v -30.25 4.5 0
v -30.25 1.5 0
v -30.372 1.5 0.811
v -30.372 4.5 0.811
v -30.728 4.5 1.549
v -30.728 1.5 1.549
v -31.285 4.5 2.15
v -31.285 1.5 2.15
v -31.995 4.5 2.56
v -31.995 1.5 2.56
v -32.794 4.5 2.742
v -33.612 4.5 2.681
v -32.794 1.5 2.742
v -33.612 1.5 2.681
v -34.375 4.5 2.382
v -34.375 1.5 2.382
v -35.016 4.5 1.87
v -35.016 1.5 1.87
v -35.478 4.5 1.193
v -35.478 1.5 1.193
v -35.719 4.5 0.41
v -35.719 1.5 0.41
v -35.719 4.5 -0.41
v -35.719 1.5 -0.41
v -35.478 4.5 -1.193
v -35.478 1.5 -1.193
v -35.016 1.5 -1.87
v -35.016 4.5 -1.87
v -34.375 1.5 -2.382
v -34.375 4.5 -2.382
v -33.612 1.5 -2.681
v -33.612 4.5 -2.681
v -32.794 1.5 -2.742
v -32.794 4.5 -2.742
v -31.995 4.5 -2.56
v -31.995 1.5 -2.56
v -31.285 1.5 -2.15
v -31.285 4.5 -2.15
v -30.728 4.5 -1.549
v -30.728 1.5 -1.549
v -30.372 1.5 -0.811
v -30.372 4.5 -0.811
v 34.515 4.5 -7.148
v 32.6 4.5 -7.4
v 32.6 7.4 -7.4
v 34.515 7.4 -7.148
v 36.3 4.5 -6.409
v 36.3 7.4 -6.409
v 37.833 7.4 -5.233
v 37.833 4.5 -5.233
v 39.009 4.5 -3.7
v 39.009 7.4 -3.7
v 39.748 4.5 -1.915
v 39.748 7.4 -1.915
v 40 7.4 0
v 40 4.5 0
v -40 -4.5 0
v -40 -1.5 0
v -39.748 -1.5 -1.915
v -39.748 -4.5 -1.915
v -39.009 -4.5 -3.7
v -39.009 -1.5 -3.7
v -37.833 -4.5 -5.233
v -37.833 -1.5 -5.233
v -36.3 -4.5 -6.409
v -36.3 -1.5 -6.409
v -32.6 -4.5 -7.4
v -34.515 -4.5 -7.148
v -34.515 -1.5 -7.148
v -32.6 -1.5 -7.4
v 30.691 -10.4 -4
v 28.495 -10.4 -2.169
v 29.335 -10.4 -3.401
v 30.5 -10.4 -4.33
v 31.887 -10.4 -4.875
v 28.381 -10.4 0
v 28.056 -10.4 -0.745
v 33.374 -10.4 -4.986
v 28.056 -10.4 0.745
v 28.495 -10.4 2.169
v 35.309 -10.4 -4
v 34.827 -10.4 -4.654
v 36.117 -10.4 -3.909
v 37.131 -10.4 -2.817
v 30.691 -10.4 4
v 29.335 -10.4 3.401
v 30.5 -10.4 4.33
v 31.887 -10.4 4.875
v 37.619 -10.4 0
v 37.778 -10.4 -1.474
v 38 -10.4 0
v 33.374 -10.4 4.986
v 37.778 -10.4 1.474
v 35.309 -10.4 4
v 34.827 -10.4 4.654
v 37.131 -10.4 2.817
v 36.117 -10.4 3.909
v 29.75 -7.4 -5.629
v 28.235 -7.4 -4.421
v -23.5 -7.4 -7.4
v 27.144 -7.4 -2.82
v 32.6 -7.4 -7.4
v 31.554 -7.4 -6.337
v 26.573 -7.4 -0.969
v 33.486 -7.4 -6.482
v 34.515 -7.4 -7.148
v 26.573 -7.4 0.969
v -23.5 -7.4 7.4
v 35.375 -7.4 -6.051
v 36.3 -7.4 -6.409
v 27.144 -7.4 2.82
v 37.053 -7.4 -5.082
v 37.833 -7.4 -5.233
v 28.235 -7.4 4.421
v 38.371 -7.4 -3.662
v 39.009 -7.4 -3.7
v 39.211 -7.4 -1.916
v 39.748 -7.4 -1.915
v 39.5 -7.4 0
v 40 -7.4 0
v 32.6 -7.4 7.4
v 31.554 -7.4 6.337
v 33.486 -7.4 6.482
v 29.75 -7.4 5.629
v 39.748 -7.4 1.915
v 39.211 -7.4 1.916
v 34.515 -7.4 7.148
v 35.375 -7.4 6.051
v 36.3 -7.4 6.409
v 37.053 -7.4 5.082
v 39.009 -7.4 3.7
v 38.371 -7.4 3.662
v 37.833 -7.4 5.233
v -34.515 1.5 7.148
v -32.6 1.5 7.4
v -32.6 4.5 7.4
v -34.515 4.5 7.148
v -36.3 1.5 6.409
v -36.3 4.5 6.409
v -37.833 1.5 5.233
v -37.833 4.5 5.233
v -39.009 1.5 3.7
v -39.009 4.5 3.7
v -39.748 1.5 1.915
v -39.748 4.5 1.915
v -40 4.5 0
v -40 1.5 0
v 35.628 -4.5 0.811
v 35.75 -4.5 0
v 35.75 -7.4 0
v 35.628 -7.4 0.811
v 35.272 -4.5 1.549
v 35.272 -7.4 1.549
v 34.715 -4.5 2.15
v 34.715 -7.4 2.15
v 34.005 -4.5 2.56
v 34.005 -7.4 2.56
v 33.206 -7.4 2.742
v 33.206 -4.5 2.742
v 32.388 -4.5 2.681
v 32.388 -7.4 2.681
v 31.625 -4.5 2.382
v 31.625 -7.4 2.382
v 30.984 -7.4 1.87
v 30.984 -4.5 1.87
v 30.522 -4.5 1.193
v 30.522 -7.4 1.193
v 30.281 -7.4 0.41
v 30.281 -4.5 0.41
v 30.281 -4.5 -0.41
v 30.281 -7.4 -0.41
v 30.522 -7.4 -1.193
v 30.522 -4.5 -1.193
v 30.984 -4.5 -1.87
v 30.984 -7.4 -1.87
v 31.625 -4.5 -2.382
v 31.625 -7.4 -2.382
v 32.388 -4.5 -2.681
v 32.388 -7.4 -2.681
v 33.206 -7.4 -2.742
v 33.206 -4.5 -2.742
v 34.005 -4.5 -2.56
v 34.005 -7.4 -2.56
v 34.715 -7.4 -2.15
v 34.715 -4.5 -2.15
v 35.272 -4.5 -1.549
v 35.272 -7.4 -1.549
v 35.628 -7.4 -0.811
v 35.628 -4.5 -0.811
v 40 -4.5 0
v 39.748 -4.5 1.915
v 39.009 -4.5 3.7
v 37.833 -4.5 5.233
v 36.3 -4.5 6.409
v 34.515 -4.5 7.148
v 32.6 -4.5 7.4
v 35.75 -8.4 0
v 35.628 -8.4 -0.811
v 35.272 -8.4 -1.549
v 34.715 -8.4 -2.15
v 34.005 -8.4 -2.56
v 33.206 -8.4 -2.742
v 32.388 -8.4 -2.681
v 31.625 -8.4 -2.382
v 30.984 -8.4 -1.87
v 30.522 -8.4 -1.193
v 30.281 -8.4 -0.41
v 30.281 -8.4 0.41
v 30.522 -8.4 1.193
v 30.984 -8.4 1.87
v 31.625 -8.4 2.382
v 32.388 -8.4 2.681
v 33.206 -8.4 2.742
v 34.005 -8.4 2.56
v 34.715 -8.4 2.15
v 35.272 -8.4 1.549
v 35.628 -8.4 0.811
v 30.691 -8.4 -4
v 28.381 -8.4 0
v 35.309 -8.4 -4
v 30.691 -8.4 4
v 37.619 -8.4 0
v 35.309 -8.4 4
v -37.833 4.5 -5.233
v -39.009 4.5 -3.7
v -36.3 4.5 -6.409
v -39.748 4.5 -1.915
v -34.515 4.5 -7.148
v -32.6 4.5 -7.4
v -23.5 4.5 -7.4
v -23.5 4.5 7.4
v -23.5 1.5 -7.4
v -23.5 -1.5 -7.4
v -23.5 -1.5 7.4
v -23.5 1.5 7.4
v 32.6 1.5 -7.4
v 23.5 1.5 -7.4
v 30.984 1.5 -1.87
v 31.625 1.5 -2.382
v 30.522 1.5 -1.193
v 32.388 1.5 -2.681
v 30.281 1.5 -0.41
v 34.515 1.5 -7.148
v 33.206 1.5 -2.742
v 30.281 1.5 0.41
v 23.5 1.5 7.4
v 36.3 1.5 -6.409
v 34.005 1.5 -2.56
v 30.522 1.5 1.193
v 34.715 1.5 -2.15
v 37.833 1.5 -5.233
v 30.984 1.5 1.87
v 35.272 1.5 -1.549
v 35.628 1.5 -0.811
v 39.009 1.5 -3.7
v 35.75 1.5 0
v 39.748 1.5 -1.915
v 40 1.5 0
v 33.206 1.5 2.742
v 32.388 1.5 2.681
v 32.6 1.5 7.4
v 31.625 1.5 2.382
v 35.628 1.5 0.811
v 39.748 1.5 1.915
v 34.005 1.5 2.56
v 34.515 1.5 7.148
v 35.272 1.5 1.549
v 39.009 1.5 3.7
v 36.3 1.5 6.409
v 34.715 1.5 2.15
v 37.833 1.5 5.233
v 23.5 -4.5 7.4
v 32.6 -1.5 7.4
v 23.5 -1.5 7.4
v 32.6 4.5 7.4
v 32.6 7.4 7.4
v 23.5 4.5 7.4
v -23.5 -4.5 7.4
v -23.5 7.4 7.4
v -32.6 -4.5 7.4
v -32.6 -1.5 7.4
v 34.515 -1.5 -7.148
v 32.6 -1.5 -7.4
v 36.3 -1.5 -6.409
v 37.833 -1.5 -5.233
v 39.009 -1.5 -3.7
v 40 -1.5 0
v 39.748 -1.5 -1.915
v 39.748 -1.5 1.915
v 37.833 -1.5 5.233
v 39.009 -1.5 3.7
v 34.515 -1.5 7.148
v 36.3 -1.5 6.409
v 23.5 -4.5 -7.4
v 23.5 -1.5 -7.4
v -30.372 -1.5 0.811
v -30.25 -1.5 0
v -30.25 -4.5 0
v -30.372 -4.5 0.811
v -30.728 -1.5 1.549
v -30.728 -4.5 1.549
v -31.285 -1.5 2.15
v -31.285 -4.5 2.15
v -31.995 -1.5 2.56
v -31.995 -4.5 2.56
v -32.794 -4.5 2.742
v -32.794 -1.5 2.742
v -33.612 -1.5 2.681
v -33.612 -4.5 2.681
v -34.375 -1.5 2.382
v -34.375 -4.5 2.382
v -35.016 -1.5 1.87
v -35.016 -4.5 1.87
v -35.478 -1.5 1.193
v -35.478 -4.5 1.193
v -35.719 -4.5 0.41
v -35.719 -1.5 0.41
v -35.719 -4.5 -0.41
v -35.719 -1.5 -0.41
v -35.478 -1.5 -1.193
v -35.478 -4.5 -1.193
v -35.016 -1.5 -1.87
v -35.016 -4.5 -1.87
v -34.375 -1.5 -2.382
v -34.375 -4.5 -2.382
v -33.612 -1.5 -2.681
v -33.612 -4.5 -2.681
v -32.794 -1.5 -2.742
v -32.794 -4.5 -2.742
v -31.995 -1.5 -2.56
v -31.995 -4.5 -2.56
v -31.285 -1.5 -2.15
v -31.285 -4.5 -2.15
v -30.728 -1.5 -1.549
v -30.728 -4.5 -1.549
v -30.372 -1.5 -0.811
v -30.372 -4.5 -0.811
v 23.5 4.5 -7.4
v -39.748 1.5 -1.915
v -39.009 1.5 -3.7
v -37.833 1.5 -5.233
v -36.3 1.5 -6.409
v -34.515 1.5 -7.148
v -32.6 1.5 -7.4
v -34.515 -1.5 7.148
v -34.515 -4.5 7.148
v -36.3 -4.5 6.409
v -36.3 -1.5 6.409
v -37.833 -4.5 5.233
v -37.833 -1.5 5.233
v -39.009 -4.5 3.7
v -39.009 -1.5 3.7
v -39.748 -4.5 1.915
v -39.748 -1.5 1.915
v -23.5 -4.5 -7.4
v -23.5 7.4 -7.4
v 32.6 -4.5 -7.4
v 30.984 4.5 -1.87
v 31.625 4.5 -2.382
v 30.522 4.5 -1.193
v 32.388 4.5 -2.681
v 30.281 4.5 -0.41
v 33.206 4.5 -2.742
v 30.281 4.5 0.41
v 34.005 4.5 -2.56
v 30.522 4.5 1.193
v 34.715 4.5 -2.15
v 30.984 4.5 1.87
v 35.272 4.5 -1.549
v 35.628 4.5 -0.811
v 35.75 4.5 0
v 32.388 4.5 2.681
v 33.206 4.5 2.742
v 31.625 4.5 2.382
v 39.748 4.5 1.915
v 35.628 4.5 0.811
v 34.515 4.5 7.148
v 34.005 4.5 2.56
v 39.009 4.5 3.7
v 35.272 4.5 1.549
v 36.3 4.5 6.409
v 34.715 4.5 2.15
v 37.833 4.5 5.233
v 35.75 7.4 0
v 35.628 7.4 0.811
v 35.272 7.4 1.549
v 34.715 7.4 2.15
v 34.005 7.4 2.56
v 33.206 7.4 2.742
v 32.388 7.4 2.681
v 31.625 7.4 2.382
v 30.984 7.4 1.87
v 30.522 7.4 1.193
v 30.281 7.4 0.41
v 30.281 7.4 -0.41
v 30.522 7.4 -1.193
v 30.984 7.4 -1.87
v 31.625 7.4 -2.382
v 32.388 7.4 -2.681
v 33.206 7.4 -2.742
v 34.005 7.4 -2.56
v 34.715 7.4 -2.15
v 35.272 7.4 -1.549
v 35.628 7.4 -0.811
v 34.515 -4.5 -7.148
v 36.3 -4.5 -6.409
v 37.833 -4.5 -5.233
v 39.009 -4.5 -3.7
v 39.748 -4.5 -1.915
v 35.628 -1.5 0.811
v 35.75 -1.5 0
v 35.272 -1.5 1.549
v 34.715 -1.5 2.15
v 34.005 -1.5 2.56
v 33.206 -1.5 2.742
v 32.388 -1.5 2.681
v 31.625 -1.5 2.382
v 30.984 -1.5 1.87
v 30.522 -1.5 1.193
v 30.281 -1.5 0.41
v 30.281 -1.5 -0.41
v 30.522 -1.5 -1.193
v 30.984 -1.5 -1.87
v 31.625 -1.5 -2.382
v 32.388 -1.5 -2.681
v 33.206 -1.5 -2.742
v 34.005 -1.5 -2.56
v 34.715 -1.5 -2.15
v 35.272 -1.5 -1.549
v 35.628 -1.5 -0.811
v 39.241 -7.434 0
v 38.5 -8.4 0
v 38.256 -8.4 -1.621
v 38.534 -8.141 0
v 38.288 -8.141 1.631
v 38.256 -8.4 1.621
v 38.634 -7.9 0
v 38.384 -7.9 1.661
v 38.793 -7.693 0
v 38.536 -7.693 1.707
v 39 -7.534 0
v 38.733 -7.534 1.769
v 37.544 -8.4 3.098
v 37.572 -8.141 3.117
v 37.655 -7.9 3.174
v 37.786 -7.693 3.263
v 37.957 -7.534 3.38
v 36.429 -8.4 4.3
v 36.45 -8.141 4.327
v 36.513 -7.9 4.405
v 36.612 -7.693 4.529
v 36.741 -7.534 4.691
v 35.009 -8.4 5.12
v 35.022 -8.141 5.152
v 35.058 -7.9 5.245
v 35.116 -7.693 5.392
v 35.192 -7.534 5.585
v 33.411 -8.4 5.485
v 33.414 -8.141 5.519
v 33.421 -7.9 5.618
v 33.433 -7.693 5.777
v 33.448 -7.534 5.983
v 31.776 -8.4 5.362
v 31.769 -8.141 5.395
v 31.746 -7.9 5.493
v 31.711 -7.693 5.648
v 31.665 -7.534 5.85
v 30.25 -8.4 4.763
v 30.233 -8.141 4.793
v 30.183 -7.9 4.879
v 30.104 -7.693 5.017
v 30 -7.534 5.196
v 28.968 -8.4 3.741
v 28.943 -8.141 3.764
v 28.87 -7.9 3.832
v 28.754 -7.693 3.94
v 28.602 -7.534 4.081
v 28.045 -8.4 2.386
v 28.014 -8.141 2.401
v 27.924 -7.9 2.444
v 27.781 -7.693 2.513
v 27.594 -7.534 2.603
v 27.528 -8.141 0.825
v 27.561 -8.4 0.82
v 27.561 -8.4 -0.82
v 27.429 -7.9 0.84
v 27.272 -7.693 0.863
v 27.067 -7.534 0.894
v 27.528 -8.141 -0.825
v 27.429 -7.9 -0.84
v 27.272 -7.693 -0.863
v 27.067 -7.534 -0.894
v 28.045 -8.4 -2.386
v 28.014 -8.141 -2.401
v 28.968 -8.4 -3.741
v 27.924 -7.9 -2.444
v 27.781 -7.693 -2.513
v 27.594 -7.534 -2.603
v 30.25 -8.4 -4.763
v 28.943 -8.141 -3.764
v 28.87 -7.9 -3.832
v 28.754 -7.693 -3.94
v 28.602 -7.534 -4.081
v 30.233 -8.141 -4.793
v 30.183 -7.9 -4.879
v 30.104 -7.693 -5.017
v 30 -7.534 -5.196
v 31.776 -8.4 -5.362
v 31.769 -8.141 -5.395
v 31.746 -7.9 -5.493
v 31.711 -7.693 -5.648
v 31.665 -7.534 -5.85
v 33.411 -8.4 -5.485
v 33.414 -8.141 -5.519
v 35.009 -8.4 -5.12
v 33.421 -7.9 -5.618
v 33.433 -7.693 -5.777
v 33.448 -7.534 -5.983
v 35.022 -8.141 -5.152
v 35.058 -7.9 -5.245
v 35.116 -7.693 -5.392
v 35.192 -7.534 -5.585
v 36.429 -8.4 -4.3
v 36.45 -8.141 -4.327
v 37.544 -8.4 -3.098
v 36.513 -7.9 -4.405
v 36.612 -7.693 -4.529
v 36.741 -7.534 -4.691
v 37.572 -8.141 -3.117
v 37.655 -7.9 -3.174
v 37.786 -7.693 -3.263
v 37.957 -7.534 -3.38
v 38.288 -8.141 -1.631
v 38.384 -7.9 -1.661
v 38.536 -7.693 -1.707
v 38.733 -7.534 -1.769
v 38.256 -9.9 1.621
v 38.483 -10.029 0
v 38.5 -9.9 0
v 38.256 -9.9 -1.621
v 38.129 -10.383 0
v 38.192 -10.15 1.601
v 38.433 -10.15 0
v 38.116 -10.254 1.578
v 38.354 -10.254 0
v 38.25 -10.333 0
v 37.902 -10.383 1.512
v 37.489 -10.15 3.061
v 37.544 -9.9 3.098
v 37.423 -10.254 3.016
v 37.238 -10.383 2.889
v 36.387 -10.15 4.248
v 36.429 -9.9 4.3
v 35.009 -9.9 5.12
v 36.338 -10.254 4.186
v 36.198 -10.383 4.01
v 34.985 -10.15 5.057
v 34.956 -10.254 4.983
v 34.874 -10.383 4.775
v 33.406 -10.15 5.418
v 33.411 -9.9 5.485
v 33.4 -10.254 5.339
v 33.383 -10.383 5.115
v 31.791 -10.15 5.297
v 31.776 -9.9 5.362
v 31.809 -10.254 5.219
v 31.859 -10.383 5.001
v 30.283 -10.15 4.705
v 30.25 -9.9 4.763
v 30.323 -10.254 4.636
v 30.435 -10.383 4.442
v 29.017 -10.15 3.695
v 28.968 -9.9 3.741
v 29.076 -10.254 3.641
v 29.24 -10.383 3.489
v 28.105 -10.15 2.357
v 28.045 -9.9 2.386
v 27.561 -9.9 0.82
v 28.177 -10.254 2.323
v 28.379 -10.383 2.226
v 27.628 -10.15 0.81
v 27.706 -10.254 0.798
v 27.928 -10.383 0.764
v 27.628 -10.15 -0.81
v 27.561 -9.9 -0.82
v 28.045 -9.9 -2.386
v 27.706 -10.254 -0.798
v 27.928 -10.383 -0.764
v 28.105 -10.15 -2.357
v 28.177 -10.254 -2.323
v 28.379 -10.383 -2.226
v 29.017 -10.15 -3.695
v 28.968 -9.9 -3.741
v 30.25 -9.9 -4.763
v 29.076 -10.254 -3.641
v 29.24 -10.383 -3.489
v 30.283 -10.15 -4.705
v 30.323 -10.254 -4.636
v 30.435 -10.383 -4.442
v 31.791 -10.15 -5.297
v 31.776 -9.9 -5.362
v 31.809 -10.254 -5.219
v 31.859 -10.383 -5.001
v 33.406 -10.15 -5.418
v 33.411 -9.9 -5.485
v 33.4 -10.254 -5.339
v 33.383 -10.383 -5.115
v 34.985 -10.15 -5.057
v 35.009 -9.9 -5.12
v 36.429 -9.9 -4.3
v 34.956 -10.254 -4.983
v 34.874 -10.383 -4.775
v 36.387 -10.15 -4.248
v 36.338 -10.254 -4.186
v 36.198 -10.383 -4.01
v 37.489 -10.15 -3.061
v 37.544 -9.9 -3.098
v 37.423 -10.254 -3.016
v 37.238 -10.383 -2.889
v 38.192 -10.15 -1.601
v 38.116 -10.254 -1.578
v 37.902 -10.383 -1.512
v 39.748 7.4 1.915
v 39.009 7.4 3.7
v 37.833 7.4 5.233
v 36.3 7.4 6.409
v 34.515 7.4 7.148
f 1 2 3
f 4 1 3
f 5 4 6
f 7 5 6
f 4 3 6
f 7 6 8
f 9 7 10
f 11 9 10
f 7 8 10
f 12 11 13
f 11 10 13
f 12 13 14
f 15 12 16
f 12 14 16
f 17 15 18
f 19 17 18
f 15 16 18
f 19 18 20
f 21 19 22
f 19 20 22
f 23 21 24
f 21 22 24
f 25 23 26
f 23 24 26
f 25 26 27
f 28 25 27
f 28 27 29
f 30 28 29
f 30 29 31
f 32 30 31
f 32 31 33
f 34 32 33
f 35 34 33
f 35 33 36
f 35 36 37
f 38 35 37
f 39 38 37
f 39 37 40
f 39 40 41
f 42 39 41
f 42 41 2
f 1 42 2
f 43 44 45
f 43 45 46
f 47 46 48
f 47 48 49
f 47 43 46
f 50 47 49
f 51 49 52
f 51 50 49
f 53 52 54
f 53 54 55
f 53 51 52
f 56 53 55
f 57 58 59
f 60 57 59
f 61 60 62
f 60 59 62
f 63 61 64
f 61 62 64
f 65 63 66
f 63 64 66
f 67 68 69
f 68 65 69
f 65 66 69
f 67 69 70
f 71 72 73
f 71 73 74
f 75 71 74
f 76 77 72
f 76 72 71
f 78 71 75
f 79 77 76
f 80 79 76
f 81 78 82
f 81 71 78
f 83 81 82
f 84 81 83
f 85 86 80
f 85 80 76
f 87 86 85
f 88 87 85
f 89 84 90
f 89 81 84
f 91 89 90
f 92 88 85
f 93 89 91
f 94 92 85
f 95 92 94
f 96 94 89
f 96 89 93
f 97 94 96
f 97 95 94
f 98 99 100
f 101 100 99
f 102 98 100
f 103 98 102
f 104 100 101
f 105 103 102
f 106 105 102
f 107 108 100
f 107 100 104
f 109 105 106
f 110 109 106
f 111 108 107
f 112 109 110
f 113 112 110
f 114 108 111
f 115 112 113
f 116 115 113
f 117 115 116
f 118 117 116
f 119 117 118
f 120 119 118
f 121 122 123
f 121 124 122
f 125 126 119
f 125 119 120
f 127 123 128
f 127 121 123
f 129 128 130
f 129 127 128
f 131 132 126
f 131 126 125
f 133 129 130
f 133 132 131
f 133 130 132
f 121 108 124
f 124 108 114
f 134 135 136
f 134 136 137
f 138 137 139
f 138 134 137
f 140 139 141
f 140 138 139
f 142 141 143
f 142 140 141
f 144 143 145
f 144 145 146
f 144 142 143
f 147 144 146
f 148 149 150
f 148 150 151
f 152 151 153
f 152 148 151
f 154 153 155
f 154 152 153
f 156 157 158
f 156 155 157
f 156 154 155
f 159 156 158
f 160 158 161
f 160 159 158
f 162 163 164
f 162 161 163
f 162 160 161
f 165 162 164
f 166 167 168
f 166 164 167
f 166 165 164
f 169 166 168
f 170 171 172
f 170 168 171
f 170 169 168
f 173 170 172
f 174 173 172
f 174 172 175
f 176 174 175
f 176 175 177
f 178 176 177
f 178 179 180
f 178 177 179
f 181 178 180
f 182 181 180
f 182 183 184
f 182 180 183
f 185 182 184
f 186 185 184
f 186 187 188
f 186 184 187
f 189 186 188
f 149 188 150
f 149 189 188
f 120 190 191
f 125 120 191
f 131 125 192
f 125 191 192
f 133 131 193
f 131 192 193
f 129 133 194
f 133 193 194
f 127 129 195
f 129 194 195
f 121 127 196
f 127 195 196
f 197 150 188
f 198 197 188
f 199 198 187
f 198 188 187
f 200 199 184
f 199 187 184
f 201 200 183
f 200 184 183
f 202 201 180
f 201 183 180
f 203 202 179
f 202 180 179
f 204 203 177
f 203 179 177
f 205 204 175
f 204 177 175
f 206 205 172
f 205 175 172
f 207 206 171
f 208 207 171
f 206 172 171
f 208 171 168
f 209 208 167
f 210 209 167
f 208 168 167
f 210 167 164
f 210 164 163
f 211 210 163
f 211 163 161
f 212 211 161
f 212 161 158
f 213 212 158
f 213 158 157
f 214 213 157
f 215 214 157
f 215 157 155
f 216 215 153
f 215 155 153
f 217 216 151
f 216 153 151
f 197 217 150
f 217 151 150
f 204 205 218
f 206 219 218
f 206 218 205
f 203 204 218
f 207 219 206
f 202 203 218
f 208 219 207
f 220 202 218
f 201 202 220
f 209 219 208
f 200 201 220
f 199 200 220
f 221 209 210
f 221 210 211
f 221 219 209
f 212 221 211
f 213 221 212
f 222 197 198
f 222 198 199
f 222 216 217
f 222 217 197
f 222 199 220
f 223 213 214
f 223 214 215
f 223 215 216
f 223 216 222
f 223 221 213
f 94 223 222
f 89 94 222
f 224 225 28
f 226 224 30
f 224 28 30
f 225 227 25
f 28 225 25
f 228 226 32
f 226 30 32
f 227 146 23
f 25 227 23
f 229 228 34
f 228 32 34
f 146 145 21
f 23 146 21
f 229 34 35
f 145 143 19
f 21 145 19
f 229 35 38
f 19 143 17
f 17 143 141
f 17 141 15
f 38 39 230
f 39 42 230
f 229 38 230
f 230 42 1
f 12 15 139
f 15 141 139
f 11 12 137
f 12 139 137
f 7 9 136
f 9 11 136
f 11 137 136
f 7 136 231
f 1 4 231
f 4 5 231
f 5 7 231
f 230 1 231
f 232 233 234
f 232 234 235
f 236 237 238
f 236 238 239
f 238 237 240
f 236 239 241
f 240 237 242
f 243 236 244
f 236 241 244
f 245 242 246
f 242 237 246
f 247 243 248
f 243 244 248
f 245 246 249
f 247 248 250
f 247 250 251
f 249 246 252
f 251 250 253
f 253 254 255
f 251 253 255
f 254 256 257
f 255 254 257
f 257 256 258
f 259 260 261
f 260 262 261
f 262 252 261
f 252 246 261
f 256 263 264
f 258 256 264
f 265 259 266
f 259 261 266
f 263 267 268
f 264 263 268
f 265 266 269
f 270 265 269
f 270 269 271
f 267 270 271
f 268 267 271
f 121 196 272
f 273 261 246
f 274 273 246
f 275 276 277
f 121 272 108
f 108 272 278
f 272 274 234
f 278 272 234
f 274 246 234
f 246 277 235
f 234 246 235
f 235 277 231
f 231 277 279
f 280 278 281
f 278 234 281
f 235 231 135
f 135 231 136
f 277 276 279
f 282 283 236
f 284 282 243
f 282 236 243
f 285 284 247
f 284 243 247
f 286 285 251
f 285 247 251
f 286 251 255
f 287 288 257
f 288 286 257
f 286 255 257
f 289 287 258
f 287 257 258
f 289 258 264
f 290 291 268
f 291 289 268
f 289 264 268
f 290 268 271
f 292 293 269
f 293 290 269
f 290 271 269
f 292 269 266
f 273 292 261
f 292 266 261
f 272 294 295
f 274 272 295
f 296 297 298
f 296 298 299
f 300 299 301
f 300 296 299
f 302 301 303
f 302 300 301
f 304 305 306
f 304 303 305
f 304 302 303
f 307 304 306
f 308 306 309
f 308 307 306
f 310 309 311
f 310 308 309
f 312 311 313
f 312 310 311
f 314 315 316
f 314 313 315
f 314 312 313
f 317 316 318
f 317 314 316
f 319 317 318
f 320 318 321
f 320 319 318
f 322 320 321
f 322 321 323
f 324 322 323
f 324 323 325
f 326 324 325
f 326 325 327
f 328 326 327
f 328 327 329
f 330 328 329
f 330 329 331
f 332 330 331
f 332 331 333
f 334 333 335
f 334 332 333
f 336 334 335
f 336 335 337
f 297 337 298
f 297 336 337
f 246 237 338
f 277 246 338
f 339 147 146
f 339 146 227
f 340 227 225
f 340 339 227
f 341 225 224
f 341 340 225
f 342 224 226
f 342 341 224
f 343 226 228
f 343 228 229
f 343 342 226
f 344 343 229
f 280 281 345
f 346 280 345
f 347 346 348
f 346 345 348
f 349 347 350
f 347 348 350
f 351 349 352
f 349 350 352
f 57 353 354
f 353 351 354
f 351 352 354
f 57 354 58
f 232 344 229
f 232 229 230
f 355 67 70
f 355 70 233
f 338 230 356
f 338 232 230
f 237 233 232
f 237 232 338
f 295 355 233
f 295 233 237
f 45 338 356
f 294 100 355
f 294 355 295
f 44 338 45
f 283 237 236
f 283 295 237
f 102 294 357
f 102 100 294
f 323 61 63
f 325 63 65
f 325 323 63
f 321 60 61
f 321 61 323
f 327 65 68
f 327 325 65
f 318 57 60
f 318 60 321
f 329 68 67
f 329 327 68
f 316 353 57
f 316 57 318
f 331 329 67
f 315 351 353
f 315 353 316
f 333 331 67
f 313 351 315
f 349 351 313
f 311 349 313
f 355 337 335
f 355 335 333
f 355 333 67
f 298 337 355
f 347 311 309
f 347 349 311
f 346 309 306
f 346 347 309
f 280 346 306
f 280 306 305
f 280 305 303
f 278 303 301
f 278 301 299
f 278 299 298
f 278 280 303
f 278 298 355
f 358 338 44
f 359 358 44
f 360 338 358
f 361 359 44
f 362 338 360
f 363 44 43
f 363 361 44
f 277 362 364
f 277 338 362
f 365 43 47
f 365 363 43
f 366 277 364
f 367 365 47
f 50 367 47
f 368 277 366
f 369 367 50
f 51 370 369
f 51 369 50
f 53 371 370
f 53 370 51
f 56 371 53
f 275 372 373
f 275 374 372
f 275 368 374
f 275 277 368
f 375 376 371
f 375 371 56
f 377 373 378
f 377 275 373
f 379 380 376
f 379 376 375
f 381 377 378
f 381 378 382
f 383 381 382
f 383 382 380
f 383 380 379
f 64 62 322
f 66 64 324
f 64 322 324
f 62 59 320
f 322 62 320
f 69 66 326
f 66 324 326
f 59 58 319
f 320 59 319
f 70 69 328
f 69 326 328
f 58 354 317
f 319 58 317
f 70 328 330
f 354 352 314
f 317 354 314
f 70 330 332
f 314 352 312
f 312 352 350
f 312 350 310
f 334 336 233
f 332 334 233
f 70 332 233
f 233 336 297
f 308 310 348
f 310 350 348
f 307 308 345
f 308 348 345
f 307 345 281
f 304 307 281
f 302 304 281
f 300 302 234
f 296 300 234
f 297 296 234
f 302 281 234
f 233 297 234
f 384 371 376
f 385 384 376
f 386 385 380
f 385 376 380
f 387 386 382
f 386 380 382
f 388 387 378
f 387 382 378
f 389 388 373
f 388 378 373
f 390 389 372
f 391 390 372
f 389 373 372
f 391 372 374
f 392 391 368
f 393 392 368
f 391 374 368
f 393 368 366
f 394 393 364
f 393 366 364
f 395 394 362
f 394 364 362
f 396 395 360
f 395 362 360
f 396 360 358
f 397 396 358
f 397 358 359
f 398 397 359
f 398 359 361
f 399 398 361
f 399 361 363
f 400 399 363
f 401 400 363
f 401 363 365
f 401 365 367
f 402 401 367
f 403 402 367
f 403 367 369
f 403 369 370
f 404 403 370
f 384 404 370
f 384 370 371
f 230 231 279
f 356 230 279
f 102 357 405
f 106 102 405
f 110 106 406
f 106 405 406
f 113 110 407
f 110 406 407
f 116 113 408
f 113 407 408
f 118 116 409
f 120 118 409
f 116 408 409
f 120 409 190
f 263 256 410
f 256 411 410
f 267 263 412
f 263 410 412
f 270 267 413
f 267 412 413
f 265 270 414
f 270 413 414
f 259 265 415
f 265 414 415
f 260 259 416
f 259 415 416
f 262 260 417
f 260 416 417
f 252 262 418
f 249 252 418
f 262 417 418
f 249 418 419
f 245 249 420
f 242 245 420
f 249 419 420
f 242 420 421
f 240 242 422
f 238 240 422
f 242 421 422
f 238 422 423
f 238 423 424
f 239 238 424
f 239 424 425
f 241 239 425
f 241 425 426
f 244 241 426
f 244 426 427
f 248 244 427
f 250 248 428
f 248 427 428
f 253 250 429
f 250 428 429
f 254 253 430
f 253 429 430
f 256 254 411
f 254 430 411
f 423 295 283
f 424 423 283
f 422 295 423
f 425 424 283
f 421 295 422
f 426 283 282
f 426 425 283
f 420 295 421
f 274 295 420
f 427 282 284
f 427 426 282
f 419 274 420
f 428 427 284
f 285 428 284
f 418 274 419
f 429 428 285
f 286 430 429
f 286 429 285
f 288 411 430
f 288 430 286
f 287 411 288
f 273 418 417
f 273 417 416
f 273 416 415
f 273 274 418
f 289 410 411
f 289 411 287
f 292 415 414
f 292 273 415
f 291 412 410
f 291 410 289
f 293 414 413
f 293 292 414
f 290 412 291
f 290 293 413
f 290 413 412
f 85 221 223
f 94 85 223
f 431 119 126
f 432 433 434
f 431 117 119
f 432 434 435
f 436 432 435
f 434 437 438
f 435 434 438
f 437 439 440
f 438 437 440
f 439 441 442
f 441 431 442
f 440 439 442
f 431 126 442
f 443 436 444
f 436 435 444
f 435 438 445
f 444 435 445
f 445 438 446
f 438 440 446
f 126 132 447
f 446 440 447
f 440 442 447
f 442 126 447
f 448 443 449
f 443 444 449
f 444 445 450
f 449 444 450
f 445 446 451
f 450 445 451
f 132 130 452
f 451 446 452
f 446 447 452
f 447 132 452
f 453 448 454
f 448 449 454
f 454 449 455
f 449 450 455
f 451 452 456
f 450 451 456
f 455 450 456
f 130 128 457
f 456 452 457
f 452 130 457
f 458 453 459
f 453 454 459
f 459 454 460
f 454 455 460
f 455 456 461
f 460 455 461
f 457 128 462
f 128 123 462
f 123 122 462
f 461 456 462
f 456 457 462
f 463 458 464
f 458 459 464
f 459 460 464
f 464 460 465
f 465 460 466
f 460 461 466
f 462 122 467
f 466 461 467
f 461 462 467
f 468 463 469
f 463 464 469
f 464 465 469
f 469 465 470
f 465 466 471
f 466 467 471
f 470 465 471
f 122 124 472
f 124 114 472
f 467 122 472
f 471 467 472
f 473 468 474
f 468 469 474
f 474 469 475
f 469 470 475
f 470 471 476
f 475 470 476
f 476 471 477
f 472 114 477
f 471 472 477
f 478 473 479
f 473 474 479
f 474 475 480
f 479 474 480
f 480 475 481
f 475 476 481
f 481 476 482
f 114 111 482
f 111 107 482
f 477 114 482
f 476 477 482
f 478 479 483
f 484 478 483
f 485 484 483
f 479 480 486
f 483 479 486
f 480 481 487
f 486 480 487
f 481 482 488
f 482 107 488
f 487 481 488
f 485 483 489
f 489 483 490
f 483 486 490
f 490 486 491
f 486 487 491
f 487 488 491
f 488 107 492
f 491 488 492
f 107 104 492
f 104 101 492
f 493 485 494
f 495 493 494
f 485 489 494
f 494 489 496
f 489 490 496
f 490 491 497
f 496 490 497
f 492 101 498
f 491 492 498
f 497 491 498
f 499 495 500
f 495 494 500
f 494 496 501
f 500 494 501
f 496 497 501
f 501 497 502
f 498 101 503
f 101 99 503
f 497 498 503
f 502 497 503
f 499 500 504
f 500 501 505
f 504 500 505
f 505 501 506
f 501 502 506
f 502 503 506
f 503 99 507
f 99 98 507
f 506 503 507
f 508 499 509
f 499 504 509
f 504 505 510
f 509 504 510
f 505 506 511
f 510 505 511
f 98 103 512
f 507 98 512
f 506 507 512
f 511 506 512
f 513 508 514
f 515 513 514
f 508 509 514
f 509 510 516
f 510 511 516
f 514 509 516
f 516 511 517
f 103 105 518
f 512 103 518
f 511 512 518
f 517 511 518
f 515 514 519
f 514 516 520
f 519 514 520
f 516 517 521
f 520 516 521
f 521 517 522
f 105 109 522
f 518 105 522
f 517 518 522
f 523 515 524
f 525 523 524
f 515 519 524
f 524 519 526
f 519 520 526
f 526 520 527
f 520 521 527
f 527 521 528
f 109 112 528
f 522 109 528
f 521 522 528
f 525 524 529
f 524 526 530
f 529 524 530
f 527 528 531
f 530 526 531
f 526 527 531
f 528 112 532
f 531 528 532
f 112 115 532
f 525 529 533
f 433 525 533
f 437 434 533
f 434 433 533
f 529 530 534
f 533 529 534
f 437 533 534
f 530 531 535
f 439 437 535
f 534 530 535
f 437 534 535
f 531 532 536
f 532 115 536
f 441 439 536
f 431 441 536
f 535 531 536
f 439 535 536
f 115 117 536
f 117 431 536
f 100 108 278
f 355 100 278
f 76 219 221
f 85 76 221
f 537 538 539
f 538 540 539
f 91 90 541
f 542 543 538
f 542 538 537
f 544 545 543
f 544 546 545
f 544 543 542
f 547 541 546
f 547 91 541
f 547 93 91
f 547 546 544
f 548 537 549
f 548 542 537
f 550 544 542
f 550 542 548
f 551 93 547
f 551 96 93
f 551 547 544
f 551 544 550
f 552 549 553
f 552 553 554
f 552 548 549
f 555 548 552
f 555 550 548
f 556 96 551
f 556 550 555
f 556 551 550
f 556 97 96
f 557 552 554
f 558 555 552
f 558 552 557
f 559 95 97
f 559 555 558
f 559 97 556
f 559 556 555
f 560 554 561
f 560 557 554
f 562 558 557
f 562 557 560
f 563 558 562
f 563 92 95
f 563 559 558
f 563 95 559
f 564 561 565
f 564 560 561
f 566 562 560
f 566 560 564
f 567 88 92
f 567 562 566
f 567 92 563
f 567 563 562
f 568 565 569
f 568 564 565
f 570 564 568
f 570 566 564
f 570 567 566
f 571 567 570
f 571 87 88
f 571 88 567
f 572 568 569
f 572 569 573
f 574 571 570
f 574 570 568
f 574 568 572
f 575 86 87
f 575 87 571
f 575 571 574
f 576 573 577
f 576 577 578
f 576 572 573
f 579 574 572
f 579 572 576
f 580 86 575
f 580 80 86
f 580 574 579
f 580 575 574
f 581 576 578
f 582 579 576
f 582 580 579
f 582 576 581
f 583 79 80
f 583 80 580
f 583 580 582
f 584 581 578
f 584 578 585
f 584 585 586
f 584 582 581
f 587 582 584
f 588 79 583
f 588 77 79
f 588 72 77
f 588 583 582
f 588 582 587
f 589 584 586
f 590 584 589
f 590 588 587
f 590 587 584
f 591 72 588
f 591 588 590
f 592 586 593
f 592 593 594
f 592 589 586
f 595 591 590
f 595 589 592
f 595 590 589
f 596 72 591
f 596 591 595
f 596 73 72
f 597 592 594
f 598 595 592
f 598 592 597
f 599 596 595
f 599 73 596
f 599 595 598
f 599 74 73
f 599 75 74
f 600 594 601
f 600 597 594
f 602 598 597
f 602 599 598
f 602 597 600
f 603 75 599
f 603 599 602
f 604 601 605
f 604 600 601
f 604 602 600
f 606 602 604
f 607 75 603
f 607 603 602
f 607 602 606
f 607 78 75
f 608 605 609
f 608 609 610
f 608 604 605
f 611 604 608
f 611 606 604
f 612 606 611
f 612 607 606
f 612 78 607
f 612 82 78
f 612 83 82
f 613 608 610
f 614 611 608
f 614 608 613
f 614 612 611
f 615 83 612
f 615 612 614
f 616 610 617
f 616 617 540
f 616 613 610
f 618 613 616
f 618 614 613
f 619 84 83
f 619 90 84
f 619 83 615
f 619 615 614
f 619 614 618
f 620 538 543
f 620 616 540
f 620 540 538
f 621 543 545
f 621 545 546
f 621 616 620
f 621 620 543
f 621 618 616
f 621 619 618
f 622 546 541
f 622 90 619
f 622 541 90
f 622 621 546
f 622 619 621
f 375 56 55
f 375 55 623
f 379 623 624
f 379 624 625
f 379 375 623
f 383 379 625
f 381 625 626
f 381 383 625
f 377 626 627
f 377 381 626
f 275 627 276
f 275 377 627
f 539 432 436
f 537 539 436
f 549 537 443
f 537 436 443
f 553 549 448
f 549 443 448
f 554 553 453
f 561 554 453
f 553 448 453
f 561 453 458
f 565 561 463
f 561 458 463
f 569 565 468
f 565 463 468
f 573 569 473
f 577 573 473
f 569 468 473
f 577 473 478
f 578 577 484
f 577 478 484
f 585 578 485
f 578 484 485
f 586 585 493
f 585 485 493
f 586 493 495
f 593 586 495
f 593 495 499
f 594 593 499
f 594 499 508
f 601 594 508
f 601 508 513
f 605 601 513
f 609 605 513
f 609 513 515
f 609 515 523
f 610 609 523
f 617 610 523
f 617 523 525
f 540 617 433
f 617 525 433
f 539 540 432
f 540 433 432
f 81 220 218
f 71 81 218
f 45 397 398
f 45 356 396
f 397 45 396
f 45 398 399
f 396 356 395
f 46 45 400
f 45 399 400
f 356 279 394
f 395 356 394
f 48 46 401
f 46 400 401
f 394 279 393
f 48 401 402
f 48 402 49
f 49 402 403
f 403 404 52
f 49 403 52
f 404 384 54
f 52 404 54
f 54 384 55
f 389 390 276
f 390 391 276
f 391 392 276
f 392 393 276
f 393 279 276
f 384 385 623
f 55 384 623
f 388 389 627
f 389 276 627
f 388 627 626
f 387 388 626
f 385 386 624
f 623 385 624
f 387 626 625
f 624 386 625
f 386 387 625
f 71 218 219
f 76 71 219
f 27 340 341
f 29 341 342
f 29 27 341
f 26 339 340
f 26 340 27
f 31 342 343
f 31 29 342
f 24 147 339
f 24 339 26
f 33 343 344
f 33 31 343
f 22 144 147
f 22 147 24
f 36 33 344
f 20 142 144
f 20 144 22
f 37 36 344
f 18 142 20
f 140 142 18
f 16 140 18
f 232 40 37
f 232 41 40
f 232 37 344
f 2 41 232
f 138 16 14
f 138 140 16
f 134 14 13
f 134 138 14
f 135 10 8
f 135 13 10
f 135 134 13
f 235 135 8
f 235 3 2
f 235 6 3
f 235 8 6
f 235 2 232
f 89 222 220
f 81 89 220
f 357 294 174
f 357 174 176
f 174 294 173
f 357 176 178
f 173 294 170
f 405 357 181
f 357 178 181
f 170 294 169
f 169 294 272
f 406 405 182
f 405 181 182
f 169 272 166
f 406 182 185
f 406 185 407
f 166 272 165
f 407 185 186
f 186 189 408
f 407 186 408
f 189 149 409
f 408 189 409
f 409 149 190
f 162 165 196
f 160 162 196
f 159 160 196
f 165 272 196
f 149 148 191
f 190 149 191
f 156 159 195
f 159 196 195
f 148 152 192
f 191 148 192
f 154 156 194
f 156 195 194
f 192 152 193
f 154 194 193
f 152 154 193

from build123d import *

# Parameters (mm, degrees)
F1_DEPTH      = 7.4
F1_DEPTH_BACK = 7.4
F3_W          = 18
F3_H          = 3
F4_DEPTH      = 25
F4_DEPTH_BACK = 25
F2_R          = 2.75
F5_DEPTH      = 25
F5_DEPTH_BACK = 25
F6_R          = 5.5
F7_DEPTH      = 3
F8_R          = 0.5
F9_R          = 1
F10_DEPTH     = 1


with BuildPart() as f1:
    # F0 (on Front) → F1 (new body, two sides)
    with BuildSketch(Plane.XZ) as f1_sk:
        with BuildLine():
            Line((-32.6, -7.4), (32.6, -7.4))
            ThreePointArc((32.6, -7.4), (37.8325901808, -5.2325901808), (40, 0))
            ThreePointArc((40, 0), (37.8325901808, 5.2325901808), (32.6, 7.4))
            Line((32.6, 7.4), (-32.6, 7.4))
            ThreePointArc((-32.6, 7.4), (-37.8325901808, 5.2325901808), (-40, 0))
            ThreePointArc((-40, 0), (-37.8325901808, -5.2325901808), (-32.6, -7.4))
        make_face()
    extrude(amount=F1_DEPTH)
    extrude(f1_sk.sketch, amount=-F1_DEPTH_BACK)

    # F3 (on Top) → F4 (cut, two sides)
    with BuildSketch(Plane.XY) as f4_sk:
        with Locations((-32.5, 6)):
            Rectangle(F3_W, F3_H)
        with Locations((-32.5, 0)):
            Rectangle(F3_W, F3_H)
        with Locations((-32.5, -6)):
            Rectangle(F3_W, F3_H)
        with Locations((32.5, 3)):
            Rectangle(F3_W, F3_H)
        with Locations((32.5, -3)):
            Rectangle(F3_W, F3_H)
    extrude(amount=F4_DEPTH, mode=Mode.SUBTRACT)
    extrude(f4_sk.sketch, amount=-F4_DEPTH_BACK, mode=Mode.SUBTRACT)

    # F2 (on Front) → F5 (cut, two sides)
    with BuildSketch(Plane.XZ) as f5_sk:
        with Locations((-33, 0)):
            Circle(F2_R)
        with Locations((33, 0)):
            Circle(F2_R)
    extrude(amount=-F5_DEPTH, mode=Mode.SUBTRACT)
    extrude(f5_sk.sketch, amount=F5_DEPTH_BACK, mode=Mode.SUBTRACT)

    # F6 (on face) → F7 (join)
    with BuildSketch(Plane.XZ.offset(7.4)):
        with Locations((33, 0)):
            Circle(F6_R)
        Polygon((37.6188021535, 0), (35.3094010768, -4), (30.6905989232, -4), (28.3811978465, 0), (30.6905989232, 4), (35.3094010768, 4), align=None, mode=Mode.SUBTRACT)
    extrude(amount=F7_DEPTH)

    # F8
    f8_edges = [f1.edges().sort_by_distance(p)[0] for p in [
        (27.5, -10.4, 0),
    ]]
    fillet(f8_edges, radius=F8_R)

    # F9
    f9_edges = [f1.edges().sort_by_distance(p)[0] for p in [
        (27.5, -7.4, 0),
    ]]
    fillet(f9_edges, radius=F9_R)

    # F10 (add): a face of the model
    f10_faces = [f1.faces().sort_by_distance(p)[0] for p in [
        (36.3582715627, -7.4, -1.9388989907),
    ]]
    extrude(f10_faces, amount=F10_DEPTH)


solid = f1.part
